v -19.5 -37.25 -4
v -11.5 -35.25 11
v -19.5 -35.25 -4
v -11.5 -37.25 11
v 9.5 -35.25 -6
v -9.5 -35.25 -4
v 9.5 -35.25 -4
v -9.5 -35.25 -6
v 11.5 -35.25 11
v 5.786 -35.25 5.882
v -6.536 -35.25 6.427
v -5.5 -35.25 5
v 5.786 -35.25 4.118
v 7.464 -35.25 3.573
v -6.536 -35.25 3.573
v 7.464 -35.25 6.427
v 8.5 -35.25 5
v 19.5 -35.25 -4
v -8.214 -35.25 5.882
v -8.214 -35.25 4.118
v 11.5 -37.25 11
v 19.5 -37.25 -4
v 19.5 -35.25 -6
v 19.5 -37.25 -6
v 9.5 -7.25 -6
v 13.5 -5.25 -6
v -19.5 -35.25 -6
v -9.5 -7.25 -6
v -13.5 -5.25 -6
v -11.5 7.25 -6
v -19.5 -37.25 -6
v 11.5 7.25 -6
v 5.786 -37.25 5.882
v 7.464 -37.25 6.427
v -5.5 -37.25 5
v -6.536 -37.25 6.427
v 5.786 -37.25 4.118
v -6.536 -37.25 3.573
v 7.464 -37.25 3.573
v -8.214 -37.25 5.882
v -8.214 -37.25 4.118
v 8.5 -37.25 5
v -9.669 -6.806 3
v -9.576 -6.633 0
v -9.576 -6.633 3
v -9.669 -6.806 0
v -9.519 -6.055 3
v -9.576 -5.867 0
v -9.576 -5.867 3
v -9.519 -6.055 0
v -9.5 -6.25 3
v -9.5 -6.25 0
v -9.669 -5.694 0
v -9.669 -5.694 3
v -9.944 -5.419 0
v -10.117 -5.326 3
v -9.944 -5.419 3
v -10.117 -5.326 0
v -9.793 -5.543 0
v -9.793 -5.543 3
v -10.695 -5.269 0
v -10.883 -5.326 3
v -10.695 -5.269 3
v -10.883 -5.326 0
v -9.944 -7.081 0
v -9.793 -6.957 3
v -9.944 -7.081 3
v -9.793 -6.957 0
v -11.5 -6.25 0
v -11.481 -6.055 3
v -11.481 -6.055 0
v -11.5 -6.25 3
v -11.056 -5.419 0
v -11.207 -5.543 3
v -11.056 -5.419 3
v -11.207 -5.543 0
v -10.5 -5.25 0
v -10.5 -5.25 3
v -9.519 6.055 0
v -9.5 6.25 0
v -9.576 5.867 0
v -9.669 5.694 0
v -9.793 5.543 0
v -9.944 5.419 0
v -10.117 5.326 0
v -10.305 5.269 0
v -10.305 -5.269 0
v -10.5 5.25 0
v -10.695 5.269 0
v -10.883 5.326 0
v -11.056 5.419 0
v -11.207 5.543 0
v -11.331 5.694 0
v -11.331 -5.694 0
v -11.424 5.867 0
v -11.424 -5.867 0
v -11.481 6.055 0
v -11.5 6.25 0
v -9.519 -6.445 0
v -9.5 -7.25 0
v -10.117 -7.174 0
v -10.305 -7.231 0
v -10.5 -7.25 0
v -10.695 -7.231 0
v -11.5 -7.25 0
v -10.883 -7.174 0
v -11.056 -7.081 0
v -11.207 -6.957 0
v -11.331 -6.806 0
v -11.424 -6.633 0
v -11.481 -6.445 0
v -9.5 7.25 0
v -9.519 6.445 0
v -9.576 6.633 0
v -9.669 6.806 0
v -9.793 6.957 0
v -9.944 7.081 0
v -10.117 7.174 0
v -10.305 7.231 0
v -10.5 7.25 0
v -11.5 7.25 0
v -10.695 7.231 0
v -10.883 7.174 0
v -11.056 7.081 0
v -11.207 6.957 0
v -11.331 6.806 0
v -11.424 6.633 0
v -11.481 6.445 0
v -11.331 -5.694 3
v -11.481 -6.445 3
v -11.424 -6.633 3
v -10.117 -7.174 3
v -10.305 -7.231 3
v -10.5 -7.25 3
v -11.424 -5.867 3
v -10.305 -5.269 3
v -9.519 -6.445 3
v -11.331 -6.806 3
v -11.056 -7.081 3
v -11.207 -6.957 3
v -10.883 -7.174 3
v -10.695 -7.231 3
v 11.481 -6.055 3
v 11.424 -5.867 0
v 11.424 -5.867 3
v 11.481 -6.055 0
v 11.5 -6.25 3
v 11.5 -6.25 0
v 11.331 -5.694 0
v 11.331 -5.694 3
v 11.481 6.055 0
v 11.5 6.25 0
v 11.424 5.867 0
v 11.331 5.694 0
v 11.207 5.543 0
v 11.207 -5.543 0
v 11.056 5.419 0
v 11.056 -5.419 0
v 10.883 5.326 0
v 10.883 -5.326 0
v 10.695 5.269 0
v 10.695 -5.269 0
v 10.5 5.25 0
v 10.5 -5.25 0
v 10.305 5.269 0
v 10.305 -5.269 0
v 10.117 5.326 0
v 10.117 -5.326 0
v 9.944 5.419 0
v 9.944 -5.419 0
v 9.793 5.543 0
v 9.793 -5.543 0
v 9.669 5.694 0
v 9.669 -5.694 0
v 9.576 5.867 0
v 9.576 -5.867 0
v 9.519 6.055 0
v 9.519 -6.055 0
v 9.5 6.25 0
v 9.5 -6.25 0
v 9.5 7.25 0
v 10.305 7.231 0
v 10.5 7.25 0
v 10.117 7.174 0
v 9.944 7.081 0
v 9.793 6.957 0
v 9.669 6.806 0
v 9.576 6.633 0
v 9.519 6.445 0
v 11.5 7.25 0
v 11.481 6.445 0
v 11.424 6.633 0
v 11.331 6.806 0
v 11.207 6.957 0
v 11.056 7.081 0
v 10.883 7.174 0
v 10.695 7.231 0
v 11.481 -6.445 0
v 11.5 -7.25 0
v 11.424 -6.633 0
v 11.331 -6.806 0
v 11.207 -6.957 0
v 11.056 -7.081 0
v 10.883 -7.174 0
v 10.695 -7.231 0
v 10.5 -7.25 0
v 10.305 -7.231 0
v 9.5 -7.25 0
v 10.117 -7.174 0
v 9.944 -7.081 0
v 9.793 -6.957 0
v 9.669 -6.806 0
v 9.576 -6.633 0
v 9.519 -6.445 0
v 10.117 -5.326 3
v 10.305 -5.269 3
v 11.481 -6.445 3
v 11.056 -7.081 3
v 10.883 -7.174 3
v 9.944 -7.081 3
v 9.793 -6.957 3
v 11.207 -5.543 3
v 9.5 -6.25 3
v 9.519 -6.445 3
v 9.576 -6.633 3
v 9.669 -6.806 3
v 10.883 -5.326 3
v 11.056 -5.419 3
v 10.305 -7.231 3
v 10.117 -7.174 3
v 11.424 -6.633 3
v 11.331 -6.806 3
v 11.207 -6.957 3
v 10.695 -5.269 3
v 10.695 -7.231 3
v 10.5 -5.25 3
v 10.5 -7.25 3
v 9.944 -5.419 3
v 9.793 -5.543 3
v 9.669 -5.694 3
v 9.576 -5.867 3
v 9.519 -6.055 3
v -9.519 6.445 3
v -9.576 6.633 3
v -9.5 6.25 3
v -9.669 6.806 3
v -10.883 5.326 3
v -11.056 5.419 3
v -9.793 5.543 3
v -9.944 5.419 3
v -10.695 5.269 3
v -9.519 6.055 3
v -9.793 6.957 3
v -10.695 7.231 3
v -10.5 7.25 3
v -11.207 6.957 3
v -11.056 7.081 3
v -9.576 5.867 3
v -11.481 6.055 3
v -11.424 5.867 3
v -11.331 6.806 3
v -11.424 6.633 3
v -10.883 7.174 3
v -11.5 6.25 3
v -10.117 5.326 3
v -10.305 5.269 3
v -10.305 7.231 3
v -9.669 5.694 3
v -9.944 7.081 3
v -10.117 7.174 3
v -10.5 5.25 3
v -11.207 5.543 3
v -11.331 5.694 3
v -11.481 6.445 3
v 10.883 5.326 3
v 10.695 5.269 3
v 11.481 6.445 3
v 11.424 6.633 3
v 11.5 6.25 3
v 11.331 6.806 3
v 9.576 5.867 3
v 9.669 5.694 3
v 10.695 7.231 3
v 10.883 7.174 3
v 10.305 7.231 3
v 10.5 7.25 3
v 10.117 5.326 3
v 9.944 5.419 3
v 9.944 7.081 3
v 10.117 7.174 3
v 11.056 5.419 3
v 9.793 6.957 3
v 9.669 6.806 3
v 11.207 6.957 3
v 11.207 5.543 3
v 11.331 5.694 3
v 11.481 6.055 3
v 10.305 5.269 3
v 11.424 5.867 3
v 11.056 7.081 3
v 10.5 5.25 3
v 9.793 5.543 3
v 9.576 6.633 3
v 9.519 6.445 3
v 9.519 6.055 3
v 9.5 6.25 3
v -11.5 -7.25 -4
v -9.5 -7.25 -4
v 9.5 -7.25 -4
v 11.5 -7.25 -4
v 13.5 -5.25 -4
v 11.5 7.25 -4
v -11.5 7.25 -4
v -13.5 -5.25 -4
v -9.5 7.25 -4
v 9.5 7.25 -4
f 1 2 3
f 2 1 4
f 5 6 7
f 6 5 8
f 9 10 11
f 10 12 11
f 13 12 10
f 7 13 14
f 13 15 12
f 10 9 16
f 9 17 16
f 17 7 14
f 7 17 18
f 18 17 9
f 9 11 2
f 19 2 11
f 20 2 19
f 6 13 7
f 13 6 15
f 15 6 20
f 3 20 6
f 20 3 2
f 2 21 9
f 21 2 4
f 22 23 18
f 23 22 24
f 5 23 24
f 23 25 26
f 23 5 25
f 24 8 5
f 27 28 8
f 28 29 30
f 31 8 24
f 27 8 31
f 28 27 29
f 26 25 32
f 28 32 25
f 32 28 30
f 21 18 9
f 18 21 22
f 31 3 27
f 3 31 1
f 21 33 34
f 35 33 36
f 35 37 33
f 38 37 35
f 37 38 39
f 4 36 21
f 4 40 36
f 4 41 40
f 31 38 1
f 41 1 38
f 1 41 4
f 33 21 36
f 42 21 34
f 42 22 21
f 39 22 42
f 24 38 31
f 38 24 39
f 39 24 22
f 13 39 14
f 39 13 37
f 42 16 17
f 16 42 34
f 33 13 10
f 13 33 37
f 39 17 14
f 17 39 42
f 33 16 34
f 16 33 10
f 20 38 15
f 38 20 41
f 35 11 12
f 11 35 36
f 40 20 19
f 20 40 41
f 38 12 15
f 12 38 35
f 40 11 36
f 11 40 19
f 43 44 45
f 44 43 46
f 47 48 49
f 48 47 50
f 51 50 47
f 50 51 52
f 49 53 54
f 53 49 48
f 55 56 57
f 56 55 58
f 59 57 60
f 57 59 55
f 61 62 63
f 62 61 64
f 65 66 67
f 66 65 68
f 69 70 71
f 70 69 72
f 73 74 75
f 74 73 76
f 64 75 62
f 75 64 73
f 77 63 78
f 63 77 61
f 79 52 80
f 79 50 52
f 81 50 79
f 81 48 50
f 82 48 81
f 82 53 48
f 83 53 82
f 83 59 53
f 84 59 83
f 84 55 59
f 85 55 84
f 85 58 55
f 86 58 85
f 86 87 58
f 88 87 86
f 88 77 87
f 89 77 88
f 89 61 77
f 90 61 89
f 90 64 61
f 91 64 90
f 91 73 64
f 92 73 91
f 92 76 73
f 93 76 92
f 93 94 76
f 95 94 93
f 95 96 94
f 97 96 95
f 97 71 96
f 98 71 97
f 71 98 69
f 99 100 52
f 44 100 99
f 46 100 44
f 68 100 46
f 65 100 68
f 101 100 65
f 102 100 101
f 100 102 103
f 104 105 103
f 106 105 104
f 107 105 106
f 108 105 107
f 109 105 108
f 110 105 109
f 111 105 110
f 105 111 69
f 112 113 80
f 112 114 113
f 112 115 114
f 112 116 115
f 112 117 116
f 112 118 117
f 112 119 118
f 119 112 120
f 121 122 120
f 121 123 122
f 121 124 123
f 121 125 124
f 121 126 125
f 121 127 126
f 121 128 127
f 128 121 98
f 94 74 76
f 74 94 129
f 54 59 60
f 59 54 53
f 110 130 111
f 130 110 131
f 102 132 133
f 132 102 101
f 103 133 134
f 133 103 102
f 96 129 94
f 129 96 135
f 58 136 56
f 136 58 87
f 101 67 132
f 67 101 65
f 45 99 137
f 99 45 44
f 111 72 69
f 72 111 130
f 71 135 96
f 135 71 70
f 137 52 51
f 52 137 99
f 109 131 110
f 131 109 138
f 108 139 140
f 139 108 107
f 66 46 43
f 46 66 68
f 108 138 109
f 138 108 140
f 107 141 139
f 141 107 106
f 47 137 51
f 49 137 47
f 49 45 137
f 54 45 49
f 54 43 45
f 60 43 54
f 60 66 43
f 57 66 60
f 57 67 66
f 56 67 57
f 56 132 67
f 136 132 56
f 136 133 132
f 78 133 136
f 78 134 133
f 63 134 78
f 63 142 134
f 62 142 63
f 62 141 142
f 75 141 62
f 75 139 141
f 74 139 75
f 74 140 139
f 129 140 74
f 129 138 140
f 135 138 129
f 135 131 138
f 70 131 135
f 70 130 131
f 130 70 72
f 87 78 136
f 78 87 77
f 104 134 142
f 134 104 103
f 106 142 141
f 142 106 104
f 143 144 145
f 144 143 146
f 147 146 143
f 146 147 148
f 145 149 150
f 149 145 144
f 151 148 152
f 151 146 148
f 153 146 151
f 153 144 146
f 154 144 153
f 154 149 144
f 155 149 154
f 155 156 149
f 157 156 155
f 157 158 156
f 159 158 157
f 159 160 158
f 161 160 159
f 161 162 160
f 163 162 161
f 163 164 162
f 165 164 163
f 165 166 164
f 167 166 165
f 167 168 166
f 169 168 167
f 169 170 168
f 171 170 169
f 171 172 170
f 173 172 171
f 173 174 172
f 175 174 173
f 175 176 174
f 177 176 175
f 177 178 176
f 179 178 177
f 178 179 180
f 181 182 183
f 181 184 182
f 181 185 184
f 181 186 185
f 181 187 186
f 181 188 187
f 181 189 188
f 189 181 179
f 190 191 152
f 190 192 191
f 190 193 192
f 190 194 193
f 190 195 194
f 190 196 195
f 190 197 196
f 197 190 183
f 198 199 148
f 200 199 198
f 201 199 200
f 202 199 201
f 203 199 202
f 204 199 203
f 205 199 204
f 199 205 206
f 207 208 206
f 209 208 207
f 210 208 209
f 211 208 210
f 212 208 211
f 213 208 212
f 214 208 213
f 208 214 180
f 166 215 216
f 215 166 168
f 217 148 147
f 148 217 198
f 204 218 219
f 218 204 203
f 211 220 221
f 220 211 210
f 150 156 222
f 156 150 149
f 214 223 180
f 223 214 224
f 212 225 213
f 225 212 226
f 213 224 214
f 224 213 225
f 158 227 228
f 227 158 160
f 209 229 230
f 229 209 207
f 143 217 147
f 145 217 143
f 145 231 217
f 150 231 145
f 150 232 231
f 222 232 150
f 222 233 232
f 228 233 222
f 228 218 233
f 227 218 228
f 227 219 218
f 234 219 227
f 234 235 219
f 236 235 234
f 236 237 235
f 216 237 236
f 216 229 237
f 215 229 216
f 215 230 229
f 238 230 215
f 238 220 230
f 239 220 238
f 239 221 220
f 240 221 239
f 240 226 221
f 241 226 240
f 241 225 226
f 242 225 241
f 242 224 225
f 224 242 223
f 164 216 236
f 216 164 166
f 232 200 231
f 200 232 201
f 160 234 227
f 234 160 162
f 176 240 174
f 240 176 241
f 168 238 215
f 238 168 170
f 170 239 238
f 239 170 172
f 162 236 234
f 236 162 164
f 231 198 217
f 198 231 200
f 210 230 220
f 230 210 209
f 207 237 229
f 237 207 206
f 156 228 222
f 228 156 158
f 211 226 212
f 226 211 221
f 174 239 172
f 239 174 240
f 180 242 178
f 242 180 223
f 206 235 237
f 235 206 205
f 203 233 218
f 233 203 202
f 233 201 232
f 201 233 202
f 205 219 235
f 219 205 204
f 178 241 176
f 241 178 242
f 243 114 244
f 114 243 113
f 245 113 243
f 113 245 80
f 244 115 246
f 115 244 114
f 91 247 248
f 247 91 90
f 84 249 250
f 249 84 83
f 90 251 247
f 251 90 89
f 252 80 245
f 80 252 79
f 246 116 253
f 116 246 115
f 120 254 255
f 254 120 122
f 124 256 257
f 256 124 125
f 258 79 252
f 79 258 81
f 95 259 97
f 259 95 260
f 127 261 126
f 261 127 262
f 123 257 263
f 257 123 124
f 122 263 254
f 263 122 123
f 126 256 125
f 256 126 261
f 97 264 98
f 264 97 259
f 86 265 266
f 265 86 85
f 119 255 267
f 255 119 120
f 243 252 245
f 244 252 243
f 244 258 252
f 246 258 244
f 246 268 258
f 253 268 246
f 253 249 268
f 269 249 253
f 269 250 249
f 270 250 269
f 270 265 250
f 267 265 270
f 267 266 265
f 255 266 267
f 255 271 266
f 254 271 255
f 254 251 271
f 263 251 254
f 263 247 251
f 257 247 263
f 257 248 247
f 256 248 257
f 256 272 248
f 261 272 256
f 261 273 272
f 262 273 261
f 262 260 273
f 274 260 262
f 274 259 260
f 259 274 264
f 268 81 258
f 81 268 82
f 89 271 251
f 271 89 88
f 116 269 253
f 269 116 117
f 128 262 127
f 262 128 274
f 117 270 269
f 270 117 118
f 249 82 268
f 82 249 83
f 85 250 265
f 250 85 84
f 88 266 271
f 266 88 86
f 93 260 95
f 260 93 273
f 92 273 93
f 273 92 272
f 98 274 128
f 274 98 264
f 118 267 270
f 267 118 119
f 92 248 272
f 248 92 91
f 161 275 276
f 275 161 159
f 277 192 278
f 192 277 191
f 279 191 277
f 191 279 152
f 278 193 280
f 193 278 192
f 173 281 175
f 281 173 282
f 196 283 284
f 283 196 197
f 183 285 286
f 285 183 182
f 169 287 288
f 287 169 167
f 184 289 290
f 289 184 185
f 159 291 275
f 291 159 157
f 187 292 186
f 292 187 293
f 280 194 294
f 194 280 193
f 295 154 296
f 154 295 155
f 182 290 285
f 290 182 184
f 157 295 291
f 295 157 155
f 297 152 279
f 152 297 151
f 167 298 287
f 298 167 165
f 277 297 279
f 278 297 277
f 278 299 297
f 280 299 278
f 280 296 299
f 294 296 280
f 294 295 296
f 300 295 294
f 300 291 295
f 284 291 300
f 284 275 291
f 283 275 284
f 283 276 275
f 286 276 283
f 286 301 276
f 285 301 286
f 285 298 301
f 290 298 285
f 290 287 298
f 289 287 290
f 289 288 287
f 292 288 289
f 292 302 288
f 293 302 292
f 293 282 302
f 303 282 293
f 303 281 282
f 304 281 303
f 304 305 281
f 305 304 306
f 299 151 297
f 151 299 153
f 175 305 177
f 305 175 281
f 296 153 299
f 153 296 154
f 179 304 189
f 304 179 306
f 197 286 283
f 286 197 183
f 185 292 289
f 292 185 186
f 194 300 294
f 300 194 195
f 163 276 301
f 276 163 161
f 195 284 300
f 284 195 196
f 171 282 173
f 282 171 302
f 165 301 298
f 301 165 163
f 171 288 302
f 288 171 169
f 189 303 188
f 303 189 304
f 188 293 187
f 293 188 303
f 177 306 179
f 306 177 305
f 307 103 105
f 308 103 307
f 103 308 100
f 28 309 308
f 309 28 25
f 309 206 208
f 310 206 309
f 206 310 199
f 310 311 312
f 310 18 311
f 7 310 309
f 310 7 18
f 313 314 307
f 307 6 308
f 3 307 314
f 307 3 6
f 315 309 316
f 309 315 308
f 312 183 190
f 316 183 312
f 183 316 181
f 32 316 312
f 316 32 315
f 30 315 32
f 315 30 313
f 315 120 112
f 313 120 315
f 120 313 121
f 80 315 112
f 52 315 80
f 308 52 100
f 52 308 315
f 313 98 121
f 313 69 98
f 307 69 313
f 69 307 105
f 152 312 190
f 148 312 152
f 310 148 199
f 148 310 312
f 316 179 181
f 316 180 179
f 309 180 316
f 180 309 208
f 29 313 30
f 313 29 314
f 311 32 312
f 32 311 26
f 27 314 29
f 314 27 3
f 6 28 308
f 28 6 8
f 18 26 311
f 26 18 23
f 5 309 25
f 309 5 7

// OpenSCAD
//
// raspberry pi cameras mount
//
// copyright 2014 Sebastien Roy
// Licence: Public domain
//

/* [General] */

// Reduce the diameter of the pegs (units are 0.01mm, so for 0.1mm enter 10)
tolerance=0; // [0:100]

// to stop customizer
module nop() { }


module centercube(sz) {
	translate(sz/-2) cube(sz);
}

//
// peg: radius of the peg cylinder. Normally 1mm
//
module camera(peg=1.0) {
	// trous
	translate([-21,-12.5,0]/2) cylinder(r=peg,h=3,$fn=32);
	translate([21,-12.5,0]/2) cylinder(r=peg,h=3,$fn=32);
	translate([-21,12.5,0]/2) cylinder(r=peg,h=3,$fn=32);
	translate([21,12.5,0]/2) cylinder(r=peg,h=3,$fn=32);
	// bras
	hull() {
	translate([-21,-12.5,-4]/2) centercube([2,2,4]);
	translate([-21,12.5,-4]/2) centercube([2,2,4]);
	}
	hull() {
	translate([21,-12.5,-4]/2) centercube([2,2,4]);
	translate([21,12.5,-4]/2) centercube([2,2,4]);
	}
	// base
	hull() {
	translate([-21,-12.5,-10]/2-[2,0,0]) centercube([2,2,2]);
	translate([-21,12.5,-10]/2) centercube([2,2,2]);
	translate([21,-12.5,-10]/2+[2,0,0]) centercube([2,2,2]);
	translate([21,12.5,-10]/2) centercube([2,2,2]);
	}
	// patte
	hull() {
	translate([-21-2,-12.5,-10]/2) centercube([4,2,2]);
	translate([-21-8,-12.5,-10]/2-[0,30,0]) centercube([10,2,2]);
	}
	hull() {
	translate([21+2,-12.5,-10]/2) centercube([4,2,2]);
	translate([21+8,-12.5,-10]/2-[0,30,0]) centercube([10,2,2]);
	}
	// plate
    difference() {
        hull() {
        translate([-21-8,-12.5,-10]/2-[0,30,0]) centercube([10,2,2]);
        translate([-21,-12.5,-10]/2-[0,30,-15/2]) centercube([2,2,2+15]);
        translate([21+8,-12.5,-10]/2-[0,30,0]) centercube([10,2,2]);
        translate([21,-12.5,-10]/2-[0,30,-15/2]) centercube([2,2,2+15]);
        }	
        translate([7,0,5])rotate([90,0,0])cylinder(60,1.5,1.5);
        translate([-7,0,5])rotate([90,0,0])cylinder(60,1.5,1.5);
    }
}

// call with the radius of the peg
camera(1-tolerance/200);
